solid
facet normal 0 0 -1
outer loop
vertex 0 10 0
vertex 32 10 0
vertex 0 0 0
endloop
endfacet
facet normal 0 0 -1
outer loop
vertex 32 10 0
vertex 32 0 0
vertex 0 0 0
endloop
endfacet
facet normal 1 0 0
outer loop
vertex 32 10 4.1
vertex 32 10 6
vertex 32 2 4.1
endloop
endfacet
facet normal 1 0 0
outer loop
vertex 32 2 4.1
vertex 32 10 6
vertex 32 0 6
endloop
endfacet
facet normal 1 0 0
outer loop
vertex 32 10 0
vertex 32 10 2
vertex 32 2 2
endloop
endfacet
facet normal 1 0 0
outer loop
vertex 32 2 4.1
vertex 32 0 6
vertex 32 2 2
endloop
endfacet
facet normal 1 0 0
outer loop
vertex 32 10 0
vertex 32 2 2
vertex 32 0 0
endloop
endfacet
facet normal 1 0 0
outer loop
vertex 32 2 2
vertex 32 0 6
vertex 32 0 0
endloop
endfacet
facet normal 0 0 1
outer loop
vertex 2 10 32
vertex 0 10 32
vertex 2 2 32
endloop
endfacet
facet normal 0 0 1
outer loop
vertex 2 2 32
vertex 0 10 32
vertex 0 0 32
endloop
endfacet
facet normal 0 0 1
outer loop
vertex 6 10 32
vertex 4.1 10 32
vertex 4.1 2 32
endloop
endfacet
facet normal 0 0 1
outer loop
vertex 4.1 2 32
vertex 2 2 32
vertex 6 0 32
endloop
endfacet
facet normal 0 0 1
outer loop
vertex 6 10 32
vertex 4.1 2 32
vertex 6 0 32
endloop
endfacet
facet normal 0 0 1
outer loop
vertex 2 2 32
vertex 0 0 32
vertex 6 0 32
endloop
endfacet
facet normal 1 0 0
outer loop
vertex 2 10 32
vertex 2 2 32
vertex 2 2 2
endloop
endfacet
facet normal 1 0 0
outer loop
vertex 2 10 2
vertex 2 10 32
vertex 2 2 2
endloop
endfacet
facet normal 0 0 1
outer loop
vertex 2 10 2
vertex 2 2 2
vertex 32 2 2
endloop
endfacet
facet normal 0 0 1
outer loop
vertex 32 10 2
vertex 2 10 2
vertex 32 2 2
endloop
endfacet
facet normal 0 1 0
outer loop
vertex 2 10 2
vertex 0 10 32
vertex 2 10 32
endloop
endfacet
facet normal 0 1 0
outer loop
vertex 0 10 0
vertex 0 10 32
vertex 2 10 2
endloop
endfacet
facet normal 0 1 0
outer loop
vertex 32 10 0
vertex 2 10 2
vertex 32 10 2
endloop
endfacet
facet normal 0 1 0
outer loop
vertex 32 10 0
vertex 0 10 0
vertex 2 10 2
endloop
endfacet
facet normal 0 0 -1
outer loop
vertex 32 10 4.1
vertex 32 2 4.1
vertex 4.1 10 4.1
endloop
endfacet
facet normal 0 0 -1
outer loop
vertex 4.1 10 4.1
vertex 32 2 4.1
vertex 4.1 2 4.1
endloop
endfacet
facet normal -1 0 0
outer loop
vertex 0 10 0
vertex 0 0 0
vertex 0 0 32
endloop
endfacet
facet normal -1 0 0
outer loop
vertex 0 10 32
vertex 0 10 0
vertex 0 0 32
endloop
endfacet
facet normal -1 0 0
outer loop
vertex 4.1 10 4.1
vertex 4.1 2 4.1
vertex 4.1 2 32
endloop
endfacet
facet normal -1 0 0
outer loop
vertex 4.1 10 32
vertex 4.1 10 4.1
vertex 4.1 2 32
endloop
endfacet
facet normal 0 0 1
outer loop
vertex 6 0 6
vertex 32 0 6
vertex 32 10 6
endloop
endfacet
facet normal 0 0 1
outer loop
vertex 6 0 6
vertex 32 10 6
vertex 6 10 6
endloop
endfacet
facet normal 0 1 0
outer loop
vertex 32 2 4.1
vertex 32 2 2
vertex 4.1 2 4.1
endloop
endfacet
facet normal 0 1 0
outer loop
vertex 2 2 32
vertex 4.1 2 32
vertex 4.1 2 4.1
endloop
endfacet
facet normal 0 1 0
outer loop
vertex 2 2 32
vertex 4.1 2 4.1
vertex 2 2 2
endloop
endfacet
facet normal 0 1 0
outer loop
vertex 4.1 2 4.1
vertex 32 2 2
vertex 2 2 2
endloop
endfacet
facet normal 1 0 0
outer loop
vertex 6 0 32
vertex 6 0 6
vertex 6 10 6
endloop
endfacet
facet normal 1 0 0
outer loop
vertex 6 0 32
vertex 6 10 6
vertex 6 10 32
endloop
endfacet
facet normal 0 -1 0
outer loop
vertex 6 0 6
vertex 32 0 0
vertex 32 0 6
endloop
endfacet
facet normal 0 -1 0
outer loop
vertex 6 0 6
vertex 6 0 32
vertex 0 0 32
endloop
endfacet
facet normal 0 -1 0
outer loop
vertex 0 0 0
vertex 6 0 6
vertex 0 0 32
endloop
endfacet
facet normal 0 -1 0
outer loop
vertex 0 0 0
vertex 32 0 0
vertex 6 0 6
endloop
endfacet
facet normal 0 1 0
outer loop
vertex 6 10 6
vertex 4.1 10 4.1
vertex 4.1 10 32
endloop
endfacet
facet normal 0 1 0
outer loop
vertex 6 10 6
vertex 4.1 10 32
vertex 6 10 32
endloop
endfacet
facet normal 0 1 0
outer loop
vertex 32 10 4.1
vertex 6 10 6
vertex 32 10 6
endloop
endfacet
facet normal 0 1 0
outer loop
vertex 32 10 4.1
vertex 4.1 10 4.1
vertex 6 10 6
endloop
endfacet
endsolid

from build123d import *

# Parameters (mm, degrees)
BOSS_EXTRUDE1_DEPTH = 2
BOSS_EXTRUDE2_DEPTH = 8


with BuildPart() as part:
    # Sketch1 → Boss-Extrude1 (new body)
    with BuildSketch(Plane(origin=(0, 0, 0), x_dir=(1, 0, 0), z_dir=(0, 1, 0))):
        Polygon((0, 0), (32, 0), (32, -6), (6, -6), (6, -32), (0, -32), align=None)
    extrude(amount=BOSS_EXTRUDE1_DEPTH)

    # Sketch2 → Boss-Extrude2 (add)
    with BuildSketch(Plane(origin=(0, 2, 0), x_dir=(1, 0, 0), z_dir=(0, 1, 0))):
        Polygon((2, -32), (2, -2), (32, -2), (32, 0), (0, 0), (0, -32), align=None)
        Polygon((32, -4.1), (4.1, -4.1), (4.1, -32), (6, -32), (6, -6), (32, -6), align=None)
    extrude(amount=BOSS_EXTRUDE2_DEPTH)


solid = part.part
